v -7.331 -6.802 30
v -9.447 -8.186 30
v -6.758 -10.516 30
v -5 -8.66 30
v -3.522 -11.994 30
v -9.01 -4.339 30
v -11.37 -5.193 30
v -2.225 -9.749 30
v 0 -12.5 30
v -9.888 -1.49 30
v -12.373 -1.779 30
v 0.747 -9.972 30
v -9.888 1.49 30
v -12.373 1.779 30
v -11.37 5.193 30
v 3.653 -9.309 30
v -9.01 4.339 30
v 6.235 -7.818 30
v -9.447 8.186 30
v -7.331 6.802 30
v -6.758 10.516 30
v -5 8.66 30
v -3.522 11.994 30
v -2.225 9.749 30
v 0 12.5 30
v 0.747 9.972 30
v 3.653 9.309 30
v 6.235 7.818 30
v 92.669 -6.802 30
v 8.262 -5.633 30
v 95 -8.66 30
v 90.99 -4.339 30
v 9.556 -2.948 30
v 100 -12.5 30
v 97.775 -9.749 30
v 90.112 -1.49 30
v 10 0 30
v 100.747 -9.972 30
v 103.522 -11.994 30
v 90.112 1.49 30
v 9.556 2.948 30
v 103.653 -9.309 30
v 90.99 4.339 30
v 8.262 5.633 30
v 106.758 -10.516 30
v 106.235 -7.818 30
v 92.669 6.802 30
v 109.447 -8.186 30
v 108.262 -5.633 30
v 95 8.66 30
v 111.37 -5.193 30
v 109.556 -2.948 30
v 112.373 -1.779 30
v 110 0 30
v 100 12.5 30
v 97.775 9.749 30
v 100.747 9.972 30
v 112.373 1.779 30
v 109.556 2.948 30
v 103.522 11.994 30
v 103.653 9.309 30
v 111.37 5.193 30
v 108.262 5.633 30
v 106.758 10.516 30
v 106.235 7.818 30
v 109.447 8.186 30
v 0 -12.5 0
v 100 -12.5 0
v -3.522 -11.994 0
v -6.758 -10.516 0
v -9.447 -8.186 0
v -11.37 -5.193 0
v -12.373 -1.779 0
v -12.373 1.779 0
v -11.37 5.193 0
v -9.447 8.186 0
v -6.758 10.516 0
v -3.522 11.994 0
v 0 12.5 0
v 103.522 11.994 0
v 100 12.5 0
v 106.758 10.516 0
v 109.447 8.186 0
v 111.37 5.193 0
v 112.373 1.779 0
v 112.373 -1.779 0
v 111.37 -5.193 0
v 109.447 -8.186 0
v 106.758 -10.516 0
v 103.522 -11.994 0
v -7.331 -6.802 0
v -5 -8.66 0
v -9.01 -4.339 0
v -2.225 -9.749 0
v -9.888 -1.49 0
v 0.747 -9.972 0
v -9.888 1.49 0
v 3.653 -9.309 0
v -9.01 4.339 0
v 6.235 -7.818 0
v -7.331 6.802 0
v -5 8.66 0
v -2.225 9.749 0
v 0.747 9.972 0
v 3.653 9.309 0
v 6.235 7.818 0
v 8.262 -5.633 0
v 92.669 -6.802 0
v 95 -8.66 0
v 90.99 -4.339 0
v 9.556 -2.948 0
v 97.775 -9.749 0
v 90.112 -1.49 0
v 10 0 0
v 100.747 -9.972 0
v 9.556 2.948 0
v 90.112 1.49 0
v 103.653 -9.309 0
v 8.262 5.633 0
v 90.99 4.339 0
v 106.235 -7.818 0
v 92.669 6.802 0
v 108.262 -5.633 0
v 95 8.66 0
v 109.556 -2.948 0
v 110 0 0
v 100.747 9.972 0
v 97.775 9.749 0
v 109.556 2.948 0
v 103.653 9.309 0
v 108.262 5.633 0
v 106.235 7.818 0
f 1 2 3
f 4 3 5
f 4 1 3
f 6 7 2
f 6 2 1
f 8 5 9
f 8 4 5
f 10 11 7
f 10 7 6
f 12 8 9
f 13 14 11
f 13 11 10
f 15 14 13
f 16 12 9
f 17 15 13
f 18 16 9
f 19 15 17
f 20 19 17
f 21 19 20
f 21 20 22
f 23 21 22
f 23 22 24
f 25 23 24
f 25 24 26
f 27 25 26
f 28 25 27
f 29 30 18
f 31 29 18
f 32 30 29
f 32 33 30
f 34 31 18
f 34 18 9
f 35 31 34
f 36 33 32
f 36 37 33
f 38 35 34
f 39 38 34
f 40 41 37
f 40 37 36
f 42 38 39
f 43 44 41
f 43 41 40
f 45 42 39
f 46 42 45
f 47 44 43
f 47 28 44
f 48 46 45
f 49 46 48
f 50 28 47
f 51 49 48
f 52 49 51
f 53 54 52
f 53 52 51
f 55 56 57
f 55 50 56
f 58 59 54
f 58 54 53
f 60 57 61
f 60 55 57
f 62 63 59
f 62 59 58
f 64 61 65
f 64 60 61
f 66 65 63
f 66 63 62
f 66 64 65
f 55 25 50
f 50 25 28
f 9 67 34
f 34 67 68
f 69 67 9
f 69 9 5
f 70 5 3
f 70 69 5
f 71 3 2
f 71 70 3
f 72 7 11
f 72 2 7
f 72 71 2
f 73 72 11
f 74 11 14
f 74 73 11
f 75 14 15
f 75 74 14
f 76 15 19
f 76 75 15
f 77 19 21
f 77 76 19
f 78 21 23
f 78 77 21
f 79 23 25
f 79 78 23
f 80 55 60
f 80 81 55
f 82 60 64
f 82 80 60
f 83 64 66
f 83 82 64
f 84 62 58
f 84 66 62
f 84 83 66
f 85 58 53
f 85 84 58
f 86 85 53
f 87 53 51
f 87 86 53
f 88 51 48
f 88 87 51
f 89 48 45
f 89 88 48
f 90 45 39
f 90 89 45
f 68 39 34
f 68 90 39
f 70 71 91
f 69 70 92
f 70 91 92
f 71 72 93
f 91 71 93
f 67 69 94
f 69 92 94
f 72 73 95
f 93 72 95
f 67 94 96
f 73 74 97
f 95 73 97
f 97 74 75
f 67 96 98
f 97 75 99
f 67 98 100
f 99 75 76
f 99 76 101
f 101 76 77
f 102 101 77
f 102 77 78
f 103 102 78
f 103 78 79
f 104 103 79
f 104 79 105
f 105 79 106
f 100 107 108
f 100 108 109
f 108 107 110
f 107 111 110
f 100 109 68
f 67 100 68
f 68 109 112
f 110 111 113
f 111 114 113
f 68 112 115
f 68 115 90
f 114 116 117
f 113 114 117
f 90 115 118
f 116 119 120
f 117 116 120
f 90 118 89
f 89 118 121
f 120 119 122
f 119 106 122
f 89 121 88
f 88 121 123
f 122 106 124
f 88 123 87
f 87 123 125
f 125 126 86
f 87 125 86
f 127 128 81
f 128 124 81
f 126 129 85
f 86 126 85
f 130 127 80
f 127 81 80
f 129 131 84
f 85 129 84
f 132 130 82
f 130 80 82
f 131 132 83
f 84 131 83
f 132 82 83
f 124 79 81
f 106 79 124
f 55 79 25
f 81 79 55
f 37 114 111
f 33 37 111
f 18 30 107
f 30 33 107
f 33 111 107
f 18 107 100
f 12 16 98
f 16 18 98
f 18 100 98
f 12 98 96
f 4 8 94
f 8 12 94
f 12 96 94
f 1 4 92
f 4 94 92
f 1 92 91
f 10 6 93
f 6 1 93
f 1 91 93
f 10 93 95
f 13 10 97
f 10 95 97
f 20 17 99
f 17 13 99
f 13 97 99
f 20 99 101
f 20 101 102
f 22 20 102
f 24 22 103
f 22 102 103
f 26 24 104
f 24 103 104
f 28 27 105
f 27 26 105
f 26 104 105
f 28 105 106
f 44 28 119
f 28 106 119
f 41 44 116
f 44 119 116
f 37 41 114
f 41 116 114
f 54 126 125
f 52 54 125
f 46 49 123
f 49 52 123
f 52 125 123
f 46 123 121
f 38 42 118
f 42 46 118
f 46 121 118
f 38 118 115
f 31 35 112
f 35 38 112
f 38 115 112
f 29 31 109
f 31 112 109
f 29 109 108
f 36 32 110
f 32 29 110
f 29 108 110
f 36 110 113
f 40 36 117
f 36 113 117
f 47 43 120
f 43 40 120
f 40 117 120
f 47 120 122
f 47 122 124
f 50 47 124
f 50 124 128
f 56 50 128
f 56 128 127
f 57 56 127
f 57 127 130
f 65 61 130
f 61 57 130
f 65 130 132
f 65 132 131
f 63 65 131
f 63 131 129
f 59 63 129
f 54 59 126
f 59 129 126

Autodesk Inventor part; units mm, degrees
ref_plane "YZ Plane" through (0, 0, 0) normal (1, 0, 0) x (0, 1, 0)
ref_plane "XZ Plane" through (0, 0, 0) normal (0, 1, 0) x (-1, 0, 0)
ref_plane "XY Plane" through (0, 0, 0) normal (0, 0, 1) x (1, 0, 0)
sketch "Boceto1" plane through (0, 0, 0) normal (0, 0, 1) x (1, 0, 0)
  circle A0 centre (0, 0) radius 10
  circle A1 centre (100, 0) radius 10
  circle A2 centre (0, 0) radius 12.5
  circle A3 centre (100, 0) radius 12.5
  line L0 (0, 12.5) -> (100, 12.5)
  line L1 (0, -12.5) -> (100, -12.5)
  dimension "d0" = 20
  dimension "d1" = 20
  dimension "d2" = 25
  dimension "d3" = 25
  dimension "d4" = 100
extrude "Extrusión1" add sketch "Boceto1" along normal blind 30
properties part number "codo"
